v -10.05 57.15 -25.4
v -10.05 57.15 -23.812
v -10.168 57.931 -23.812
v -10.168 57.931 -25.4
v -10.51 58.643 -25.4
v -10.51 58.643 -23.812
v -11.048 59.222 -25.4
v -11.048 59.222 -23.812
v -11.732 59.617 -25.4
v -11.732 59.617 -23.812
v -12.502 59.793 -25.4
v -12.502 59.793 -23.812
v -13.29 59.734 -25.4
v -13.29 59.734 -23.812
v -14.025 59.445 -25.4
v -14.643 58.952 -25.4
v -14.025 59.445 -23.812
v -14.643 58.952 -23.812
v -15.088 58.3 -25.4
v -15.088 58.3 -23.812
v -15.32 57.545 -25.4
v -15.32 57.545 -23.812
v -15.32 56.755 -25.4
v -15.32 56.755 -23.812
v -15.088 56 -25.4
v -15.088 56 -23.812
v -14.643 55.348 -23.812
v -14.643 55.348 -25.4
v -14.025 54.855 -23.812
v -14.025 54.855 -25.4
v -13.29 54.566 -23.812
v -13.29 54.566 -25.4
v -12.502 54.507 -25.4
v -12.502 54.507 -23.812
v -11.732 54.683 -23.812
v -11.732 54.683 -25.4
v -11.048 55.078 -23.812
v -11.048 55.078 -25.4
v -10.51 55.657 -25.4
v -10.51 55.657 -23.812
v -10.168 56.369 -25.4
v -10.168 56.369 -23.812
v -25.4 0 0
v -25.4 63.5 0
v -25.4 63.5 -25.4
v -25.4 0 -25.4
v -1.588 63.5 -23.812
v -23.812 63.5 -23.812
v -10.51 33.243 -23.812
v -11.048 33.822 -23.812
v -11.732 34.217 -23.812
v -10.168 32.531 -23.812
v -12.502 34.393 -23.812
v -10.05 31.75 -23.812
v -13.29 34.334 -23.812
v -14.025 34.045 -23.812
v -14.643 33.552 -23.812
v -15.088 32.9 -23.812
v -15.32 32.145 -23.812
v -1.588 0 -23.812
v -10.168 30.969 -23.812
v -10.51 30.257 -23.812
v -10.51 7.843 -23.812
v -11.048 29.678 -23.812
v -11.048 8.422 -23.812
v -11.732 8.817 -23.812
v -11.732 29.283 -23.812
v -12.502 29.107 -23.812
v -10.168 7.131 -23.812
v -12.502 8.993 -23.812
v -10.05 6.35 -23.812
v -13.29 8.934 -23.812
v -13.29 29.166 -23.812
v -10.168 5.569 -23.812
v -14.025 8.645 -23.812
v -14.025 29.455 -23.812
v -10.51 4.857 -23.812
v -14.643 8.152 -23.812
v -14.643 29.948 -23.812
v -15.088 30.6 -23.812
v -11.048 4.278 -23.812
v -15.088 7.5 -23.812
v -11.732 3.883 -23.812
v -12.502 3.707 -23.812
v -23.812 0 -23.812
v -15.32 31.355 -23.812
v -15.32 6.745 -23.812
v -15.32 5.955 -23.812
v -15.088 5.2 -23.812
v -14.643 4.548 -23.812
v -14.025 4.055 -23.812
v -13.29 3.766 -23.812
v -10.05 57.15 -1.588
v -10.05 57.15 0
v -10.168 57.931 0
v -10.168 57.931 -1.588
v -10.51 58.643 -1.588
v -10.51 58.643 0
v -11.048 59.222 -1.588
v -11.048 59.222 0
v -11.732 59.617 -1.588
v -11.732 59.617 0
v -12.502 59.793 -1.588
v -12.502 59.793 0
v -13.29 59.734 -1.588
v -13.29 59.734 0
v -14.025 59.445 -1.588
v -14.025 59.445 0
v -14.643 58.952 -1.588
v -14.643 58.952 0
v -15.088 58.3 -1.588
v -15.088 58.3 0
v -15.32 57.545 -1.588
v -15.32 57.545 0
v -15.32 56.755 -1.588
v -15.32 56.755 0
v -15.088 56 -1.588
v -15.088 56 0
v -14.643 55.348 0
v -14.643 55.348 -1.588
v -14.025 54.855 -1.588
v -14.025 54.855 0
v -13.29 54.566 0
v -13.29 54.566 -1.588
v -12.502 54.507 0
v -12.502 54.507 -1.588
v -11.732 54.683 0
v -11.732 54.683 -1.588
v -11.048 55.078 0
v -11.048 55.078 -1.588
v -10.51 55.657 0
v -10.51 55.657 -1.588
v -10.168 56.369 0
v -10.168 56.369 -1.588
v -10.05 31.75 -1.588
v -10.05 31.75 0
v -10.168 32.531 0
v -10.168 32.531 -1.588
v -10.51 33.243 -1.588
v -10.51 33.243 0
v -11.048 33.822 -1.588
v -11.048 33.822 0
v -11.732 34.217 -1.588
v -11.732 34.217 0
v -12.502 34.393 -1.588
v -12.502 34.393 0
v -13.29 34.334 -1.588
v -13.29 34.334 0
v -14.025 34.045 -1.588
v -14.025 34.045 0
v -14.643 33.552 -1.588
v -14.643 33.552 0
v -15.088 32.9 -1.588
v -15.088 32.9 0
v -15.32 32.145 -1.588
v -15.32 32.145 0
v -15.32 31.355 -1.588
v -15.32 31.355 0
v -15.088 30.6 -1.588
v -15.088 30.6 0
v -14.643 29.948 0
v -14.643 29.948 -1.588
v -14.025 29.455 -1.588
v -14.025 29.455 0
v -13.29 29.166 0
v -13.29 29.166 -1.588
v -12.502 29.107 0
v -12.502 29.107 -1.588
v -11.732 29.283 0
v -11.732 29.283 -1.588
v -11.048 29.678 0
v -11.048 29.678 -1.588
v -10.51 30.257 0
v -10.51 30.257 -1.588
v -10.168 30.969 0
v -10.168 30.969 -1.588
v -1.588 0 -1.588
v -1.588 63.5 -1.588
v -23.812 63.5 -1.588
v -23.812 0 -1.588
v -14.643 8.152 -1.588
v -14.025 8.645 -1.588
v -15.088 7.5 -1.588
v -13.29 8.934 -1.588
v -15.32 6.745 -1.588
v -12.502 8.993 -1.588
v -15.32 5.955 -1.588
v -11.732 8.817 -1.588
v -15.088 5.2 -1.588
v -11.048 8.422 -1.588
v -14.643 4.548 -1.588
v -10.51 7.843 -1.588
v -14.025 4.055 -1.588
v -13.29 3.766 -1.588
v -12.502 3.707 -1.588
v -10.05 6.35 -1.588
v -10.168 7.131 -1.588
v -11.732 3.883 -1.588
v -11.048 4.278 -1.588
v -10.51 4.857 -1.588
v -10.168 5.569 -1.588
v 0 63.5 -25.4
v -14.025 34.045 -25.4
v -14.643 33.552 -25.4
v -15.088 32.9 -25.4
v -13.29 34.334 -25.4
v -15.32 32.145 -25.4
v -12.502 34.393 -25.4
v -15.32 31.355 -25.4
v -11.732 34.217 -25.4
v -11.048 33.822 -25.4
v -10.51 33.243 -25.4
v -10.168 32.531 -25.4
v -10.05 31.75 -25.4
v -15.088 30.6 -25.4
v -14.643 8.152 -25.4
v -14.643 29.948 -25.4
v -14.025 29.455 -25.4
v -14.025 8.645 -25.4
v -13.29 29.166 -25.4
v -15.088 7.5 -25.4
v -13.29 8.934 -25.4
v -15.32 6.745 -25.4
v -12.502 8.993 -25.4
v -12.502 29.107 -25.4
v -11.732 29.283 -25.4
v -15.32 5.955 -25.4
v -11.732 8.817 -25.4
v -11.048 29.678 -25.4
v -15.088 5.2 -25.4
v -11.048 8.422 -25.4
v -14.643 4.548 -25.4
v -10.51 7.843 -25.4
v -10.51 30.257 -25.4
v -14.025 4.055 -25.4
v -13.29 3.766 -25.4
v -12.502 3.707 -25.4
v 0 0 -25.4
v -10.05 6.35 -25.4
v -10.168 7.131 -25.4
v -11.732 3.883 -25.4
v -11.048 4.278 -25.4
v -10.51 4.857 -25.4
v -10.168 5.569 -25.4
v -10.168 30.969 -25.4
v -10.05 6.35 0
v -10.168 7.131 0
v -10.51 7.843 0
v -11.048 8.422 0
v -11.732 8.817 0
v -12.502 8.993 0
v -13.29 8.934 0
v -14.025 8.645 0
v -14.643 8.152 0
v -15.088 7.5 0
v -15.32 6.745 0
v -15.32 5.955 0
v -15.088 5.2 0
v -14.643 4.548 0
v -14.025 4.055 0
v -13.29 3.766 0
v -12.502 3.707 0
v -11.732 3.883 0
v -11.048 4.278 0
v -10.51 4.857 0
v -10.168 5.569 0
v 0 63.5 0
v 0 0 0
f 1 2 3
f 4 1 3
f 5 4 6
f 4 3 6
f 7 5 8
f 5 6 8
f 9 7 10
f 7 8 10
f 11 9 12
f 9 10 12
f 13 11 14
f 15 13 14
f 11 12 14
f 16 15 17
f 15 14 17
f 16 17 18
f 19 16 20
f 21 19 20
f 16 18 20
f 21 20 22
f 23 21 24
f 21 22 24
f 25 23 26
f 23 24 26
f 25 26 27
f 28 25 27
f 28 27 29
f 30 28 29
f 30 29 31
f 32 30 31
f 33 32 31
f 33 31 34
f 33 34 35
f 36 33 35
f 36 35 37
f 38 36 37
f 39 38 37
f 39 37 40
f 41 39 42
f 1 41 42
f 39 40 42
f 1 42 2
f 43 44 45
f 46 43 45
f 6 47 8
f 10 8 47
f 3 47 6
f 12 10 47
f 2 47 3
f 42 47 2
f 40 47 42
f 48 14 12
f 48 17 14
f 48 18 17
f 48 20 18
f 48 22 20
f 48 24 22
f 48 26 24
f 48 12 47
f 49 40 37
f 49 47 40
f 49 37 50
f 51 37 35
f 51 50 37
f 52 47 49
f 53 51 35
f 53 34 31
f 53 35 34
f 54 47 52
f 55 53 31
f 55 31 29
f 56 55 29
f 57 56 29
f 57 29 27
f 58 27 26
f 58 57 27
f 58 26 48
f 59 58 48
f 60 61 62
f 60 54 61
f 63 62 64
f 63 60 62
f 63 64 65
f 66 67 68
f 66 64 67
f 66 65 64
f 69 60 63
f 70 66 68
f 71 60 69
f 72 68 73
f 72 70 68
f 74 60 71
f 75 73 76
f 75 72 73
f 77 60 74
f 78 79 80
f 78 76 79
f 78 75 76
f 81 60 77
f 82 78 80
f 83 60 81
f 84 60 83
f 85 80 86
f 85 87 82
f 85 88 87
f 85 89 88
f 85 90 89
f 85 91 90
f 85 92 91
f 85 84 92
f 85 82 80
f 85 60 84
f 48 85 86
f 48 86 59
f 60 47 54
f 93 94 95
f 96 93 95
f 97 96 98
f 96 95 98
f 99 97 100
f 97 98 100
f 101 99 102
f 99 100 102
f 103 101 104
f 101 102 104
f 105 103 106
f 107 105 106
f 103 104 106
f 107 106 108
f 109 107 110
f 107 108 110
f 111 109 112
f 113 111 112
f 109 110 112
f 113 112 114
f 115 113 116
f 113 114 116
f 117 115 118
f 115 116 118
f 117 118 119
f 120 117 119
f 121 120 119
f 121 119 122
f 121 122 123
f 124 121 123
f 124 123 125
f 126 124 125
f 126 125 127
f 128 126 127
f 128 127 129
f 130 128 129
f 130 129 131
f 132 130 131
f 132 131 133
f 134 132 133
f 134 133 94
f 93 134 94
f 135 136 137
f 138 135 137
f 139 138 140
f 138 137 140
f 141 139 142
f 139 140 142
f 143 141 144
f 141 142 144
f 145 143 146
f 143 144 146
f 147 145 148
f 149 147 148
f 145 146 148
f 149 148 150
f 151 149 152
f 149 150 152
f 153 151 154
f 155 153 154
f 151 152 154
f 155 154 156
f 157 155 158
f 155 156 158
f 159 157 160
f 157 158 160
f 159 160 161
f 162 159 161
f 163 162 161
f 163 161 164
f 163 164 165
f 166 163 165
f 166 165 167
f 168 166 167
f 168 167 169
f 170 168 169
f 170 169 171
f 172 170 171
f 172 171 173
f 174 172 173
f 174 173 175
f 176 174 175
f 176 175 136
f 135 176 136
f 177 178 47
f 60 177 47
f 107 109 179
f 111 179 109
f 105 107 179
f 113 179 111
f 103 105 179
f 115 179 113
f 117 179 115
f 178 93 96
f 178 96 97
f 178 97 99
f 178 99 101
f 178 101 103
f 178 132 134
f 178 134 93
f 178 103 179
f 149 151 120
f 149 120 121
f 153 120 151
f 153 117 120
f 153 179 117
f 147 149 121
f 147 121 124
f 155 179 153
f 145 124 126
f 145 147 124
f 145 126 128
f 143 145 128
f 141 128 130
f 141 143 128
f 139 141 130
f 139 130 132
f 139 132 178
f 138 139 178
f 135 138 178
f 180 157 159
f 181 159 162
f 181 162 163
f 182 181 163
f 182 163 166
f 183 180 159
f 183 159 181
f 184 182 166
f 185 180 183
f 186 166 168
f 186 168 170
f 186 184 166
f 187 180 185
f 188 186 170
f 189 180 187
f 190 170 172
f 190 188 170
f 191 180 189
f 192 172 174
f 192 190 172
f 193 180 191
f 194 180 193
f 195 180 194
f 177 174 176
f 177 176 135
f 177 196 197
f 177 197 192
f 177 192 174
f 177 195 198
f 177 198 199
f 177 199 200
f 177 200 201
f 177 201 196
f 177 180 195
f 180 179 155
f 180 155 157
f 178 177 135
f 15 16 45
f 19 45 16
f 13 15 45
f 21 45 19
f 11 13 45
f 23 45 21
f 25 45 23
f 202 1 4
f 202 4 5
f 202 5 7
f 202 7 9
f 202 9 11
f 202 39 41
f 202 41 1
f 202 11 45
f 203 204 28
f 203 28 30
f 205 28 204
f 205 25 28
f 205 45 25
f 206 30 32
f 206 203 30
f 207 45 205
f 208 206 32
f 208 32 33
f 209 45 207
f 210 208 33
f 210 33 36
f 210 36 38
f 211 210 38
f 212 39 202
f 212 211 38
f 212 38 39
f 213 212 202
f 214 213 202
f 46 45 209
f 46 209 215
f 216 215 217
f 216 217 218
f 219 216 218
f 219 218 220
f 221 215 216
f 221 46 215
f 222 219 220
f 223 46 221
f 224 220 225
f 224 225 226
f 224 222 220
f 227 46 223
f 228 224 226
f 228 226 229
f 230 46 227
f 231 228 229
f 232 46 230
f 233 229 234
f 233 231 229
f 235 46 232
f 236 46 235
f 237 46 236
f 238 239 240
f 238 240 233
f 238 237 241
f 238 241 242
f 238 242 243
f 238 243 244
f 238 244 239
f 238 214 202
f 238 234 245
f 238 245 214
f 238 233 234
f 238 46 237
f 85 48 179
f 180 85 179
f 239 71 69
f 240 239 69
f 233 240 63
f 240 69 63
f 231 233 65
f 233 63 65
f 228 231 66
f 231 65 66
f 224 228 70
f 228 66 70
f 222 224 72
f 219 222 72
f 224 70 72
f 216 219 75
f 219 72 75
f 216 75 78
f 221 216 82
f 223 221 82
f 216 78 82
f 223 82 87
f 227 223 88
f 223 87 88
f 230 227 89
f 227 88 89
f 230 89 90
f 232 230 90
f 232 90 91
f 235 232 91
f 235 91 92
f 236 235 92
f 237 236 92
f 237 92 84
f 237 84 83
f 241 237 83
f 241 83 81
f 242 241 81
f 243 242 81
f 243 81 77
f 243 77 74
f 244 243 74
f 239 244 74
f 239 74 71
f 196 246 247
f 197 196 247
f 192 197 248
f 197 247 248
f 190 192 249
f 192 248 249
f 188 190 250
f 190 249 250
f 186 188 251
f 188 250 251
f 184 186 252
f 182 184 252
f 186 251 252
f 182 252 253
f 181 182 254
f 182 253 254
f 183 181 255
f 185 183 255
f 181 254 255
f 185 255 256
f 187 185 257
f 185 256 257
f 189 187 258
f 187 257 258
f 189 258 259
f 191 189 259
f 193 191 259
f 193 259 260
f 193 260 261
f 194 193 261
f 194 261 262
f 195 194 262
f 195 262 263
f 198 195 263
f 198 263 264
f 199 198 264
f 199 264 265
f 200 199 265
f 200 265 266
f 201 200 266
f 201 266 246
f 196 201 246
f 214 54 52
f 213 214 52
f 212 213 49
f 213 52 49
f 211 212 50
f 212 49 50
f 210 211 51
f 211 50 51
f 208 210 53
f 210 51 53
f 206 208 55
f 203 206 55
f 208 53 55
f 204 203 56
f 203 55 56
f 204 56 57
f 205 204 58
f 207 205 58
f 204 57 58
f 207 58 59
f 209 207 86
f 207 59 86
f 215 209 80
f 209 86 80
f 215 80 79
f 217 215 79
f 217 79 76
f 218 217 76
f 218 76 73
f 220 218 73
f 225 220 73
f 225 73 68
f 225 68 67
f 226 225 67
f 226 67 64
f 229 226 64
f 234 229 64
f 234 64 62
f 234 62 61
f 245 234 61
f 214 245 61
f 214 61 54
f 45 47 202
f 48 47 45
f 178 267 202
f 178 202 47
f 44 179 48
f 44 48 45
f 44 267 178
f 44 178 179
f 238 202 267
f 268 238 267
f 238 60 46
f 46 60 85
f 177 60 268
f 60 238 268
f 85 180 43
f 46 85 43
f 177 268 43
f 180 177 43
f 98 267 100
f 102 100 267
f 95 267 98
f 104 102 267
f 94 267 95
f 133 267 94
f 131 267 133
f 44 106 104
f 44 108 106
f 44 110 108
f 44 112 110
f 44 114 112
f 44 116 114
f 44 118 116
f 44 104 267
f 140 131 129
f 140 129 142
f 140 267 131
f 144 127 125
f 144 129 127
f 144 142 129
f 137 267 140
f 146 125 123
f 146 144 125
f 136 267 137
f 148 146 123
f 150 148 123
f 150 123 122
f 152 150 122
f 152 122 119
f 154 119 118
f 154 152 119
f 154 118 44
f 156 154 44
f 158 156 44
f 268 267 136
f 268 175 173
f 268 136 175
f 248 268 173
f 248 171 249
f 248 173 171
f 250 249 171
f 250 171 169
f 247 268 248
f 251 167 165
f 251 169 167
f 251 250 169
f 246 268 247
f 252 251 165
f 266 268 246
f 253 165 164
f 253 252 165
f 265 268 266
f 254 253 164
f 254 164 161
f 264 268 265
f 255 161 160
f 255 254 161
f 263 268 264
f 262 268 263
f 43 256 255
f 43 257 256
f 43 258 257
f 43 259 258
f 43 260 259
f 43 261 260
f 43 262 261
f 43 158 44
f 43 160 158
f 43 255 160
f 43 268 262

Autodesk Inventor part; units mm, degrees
ref_plane "YZ Plane" through (0, 0, 0) normal (1, 0, 0) x (0, 1, 0)
ref_plane "XZ Plane" through (0, 0, 0) normal (0, 1, 0) x (-1, 0, 0)
ref_plane "XY Plane" through (0, 0, 0) normal (0, 0, 1) x (1, 0, 0)
sketch "Sketch1" plane through (0, 0, 0) normal (0, 1, 0) x (-1, 0, 0)
  line L0 (0, 0) -> (25.4, 0)
  line L1 (25.4, 0) -> (25.4, -25.4)
  line L2 (25.4, -25.4) -> (0, -25.4)
  line L3 (0, -25.4) -> (0, 0)
  line L4 (23.8125, -1.5875) -> (1.5875, -1.5875)
  line L5 (1.5875, -1.5875) -> (1.5875, -23.8125)
  line L6 (1.5875, -23.8125) -> (23.8125, -23.8125)
  line L7 (23.8125, -23.8125) -> (23.8125, -1.5875)
  dimension "d0" = 25.4
  dimension "d1" = 25.4
  dimension "d2" = 1.5875
  dimension "d3" = 1.5875
  dimension "d4" = 1.5875
  dimension "d5" = 1.5875
extrude "Extrusion1" add sketch "Sketch1" along normal blind 63.5
sketch "Sketch2" plane through (-25.4, 0, 0) normal (0, 0, 1) x (1, 0, 0)
  line L0 (1.5875, 63.5) -> (23.8125, 63.5) construction
  line L1 (12.7, 63.5) -> (12.7, 0) construction
  line L2 (23.8125, 0) -> (1.5875, 0) construction
  line L3 (0, 0) -> (0, 63.5) construction
  line L4 (0, 31.75) -> (25.4, 31.75) construction
  circle A0 centre (12.7, 31.75) radius 2.65
  circle A1 centre (12.7, 57.15) radius 2.65
  circle A2 centre (12.7, 6.35) radius 2.65
  point P0 (25.4, 0)
  point P1 (12.7, 31.75)
  dimension "d8" = 5.3
  dimension "d9" = 25.4
  dimension "d10" = 25.4
extrude "Extrusion2" cut sketch "Sketch2" against normal through all
properties part number "2.5inTube"
